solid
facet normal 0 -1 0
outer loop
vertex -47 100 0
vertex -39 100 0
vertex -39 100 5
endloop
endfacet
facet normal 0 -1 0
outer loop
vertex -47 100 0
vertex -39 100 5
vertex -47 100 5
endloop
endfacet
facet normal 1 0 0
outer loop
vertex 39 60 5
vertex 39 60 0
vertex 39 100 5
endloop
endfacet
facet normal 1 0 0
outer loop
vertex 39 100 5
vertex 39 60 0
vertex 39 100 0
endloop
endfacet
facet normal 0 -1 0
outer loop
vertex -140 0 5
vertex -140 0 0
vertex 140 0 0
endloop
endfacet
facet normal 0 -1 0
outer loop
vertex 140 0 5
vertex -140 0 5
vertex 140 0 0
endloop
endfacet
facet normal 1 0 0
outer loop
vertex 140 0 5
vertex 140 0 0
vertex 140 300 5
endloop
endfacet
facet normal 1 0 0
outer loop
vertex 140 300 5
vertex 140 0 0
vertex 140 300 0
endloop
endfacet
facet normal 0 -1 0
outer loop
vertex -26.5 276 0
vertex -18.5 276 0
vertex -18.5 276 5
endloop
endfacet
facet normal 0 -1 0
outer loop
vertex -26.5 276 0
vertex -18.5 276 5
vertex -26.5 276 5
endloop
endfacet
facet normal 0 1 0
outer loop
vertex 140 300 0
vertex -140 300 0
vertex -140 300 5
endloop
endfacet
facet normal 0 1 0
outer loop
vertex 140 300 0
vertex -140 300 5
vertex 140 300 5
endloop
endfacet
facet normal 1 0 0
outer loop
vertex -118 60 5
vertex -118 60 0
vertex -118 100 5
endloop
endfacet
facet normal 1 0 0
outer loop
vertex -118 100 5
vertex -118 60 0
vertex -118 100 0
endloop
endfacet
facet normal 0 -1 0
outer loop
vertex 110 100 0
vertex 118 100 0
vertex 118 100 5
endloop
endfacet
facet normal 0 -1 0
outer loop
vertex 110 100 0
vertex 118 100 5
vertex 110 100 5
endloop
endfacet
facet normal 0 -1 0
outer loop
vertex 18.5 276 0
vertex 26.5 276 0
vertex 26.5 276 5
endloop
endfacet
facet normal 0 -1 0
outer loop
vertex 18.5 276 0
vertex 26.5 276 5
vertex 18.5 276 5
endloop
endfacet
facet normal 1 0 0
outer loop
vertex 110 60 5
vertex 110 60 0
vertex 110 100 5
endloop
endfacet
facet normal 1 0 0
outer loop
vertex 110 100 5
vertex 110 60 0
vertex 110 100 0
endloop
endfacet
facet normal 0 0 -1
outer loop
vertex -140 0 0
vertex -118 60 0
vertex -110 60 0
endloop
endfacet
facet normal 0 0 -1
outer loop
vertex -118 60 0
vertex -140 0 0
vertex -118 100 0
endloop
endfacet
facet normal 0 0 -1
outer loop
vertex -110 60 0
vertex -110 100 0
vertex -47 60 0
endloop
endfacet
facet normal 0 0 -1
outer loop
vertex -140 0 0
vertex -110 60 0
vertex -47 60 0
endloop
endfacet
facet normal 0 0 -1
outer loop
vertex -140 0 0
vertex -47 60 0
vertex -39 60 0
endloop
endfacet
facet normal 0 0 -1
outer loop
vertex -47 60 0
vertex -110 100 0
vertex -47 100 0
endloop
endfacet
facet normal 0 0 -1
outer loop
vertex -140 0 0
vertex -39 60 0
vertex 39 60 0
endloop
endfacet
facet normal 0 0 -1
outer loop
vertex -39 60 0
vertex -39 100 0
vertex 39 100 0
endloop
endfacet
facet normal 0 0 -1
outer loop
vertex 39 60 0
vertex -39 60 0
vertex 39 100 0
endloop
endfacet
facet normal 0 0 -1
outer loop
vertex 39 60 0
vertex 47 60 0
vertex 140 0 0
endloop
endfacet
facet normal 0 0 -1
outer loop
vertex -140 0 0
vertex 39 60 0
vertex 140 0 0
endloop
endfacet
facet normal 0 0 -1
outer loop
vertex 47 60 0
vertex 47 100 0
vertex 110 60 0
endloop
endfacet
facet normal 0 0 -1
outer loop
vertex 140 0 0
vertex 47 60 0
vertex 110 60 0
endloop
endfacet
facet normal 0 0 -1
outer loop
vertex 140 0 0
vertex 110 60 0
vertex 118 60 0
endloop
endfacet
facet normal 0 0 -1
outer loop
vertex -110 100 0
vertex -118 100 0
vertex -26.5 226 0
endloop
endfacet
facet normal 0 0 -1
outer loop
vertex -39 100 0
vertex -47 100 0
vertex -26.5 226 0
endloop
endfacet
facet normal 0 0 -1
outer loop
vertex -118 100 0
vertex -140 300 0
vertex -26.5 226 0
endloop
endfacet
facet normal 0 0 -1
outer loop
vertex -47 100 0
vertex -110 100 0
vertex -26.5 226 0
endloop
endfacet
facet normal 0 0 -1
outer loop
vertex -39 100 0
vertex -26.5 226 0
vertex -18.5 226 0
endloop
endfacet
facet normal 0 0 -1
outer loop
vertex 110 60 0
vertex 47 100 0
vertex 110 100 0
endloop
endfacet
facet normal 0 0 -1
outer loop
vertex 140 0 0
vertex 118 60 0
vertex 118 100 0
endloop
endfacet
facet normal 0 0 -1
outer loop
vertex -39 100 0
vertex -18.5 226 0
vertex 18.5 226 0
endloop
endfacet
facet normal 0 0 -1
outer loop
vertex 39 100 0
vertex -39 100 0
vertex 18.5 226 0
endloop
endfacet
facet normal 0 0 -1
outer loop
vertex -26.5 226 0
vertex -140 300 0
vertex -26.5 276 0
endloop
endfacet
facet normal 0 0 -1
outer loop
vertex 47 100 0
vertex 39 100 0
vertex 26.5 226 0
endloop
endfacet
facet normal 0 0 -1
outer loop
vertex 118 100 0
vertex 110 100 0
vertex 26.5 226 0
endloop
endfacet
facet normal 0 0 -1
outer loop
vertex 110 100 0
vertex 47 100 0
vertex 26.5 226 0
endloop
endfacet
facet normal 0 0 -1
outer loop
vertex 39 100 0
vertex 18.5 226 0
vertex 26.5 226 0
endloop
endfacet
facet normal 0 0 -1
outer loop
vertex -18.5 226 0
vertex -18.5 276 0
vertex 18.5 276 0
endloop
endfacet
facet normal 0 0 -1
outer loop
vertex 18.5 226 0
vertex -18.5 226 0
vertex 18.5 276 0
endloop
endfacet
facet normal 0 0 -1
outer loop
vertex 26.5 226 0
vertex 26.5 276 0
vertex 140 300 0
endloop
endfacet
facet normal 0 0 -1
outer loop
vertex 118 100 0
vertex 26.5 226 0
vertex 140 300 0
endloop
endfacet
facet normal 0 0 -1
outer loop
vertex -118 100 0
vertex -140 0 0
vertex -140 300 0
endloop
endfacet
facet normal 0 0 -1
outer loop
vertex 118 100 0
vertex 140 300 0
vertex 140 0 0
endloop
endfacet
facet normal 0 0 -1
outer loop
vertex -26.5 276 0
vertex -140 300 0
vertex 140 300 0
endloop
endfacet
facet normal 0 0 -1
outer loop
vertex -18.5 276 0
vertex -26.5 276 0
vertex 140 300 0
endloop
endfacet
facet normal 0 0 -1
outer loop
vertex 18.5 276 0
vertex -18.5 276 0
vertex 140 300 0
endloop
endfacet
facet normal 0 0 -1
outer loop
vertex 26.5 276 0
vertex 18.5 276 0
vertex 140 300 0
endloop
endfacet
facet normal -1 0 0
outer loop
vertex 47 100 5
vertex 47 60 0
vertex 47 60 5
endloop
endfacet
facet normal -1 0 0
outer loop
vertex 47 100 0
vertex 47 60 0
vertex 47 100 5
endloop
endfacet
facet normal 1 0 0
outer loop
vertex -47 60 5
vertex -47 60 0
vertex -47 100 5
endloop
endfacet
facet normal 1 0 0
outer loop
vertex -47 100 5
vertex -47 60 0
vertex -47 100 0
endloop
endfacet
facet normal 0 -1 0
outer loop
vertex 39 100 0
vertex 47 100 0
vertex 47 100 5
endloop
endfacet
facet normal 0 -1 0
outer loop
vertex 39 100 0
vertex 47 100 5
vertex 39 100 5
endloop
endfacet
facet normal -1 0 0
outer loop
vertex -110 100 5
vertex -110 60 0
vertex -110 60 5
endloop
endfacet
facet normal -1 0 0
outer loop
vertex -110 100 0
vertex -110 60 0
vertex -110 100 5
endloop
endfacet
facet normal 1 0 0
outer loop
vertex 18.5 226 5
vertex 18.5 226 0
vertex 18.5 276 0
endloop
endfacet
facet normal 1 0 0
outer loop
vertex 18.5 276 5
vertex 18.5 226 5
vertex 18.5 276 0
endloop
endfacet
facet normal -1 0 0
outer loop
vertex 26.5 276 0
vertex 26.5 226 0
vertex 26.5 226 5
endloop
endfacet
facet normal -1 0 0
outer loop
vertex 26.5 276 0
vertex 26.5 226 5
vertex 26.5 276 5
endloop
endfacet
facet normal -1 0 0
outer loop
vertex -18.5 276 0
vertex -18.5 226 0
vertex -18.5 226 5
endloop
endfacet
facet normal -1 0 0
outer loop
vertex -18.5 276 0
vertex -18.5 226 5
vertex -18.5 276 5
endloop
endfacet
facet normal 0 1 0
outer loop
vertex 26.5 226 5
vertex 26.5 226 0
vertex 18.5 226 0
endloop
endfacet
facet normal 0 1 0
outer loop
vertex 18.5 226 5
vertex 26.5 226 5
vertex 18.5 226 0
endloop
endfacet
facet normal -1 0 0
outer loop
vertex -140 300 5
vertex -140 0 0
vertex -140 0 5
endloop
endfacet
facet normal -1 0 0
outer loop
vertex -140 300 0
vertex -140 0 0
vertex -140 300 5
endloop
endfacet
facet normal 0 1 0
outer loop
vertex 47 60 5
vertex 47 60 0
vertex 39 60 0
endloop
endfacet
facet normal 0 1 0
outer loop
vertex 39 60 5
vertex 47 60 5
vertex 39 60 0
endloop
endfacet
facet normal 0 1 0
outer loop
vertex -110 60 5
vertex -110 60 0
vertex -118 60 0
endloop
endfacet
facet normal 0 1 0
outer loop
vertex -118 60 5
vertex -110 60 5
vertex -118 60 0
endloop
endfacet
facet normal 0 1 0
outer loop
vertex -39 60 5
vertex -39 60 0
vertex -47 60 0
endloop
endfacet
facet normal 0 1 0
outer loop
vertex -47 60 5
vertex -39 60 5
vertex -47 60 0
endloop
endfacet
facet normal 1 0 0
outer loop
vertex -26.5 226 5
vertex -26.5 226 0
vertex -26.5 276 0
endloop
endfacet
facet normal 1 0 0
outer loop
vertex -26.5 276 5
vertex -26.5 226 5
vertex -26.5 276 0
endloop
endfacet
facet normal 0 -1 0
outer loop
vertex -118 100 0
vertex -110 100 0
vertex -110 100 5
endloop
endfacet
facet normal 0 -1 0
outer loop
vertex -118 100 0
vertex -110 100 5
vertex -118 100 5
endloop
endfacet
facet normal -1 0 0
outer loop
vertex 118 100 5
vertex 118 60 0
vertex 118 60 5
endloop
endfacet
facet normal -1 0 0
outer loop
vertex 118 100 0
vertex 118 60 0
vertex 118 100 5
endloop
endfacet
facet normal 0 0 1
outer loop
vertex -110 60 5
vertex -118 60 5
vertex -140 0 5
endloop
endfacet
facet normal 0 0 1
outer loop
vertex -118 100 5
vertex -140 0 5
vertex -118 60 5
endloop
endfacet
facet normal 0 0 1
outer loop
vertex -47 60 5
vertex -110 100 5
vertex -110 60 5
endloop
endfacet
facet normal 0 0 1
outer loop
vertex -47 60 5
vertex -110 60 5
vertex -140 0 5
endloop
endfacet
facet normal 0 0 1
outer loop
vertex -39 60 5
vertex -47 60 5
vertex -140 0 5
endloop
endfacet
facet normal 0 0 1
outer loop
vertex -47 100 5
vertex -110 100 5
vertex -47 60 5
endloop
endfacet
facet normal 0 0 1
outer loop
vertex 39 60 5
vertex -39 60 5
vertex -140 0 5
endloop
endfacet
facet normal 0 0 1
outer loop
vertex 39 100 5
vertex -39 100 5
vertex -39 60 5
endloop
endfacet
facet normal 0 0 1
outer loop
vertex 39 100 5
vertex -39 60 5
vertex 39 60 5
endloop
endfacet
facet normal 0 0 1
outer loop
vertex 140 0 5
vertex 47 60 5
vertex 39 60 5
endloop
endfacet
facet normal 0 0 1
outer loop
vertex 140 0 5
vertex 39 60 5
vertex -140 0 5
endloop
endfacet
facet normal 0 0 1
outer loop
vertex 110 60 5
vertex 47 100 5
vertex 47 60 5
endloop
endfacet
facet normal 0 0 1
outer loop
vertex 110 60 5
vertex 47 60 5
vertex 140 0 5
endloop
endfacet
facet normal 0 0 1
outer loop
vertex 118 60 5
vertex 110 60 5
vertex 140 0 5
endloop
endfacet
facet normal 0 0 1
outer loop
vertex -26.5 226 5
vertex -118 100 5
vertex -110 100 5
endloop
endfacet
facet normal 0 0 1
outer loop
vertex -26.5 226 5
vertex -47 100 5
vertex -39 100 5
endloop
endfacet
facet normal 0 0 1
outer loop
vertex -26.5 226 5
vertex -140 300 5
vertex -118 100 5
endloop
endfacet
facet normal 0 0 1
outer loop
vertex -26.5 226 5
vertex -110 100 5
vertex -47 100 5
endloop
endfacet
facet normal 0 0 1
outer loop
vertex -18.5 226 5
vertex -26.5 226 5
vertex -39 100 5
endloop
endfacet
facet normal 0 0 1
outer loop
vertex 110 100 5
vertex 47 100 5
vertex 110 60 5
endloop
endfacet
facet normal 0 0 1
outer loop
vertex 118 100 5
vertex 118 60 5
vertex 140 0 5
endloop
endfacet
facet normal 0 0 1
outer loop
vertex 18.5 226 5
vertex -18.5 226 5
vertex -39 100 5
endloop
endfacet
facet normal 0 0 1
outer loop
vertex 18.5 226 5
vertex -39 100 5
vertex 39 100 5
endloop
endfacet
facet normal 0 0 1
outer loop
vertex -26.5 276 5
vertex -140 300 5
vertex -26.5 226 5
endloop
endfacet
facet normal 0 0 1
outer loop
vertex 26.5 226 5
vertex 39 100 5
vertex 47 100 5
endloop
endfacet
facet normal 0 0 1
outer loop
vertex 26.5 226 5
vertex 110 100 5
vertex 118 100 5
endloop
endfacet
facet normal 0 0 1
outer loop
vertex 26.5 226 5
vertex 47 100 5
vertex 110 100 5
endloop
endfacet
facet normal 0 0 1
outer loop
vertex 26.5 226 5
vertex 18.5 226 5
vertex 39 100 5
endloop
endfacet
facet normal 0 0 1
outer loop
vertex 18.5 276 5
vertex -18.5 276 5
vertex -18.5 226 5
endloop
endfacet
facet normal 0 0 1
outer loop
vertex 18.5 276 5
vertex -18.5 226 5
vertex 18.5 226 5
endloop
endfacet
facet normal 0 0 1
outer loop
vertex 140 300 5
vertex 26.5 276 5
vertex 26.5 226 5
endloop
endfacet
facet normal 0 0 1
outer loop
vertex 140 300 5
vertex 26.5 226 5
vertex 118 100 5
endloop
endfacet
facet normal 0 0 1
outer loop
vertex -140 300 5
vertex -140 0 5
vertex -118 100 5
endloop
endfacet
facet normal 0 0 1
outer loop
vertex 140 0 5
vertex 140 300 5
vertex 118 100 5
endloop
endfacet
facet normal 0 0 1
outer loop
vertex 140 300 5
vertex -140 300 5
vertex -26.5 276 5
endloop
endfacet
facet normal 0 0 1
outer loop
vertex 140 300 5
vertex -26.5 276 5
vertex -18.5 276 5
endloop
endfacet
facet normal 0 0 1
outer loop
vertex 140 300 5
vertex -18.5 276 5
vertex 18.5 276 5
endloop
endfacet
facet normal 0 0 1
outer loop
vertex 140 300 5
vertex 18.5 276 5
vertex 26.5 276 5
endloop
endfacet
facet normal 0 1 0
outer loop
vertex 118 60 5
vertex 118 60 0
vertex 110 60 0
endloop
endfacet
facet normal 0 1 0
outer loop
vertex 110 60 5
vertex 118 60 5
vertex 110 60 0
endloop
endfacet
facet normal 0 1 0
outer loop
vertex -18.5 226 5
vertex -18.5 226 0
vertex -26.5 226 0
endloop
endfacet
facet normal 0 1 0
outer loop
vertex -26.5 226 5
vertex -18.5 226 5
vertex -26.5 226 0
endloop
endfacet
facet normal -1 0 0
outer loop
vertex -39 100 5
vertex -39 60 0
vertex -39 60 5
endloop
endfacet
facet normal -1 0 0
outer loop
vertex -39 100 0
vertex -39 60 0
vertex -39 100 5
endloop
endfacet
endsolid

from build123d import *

# Parameters (mm, degrees)
SKETCH1_W           = 280
SKETCH1_H           = 300
BOSS_EXTRUDE1_DEPTH = 5
SKETCH2_W           = 8
SKETCH2_H           = 40
SKETCH2_H_2         = 50
CUT_EXTRUDE1_DEPTH  = 332.096662623


with BuildPart() as part:
    # Sketch1 → Boss-Extrude1 (new body)
    with BuildSketch(Plane.XY):
        with Locations((0, 150)):
            Rectangle(SKETCH1_W, SKETCH1_H)
    extrude(amount=BOSS_EXTRUDE1_DEPTH)

    # Sketch2 → Cut-Extrude1 (cut, through all)
    with BuildSketch(Plane(origin=(0, 0, 0), x_dir=(-1, 0, 0), z_dir=(0, 0, -1))):
        with Locations((-114, 80)):
            Rectangle(SKETCH2_W, SKETCH2_H)
        with Locations((-43, 80)):
            Rectangle(SKETCH2_W, SKETCH2_H)
        with Locations((43, 80)):
            Rectangle(SKETCH2_W, SKETCH2_H)
        with Locations((114, 80)):
            Rectangle(SKETCH2_W, SKETCH2_H)
        with Locations((-22.5, 251)):
            Rectangle(SKETCH2_W, SKETCH2_H_2)
        with Locations((22.5, 251)):
            Rectangle(SKETCH2_W, SKETCH2_H_2)
    extrude(amount=-CUT_EXTRUDE1_DEPTH, mode=Mode.SUBTRACT)


solid = part.part
